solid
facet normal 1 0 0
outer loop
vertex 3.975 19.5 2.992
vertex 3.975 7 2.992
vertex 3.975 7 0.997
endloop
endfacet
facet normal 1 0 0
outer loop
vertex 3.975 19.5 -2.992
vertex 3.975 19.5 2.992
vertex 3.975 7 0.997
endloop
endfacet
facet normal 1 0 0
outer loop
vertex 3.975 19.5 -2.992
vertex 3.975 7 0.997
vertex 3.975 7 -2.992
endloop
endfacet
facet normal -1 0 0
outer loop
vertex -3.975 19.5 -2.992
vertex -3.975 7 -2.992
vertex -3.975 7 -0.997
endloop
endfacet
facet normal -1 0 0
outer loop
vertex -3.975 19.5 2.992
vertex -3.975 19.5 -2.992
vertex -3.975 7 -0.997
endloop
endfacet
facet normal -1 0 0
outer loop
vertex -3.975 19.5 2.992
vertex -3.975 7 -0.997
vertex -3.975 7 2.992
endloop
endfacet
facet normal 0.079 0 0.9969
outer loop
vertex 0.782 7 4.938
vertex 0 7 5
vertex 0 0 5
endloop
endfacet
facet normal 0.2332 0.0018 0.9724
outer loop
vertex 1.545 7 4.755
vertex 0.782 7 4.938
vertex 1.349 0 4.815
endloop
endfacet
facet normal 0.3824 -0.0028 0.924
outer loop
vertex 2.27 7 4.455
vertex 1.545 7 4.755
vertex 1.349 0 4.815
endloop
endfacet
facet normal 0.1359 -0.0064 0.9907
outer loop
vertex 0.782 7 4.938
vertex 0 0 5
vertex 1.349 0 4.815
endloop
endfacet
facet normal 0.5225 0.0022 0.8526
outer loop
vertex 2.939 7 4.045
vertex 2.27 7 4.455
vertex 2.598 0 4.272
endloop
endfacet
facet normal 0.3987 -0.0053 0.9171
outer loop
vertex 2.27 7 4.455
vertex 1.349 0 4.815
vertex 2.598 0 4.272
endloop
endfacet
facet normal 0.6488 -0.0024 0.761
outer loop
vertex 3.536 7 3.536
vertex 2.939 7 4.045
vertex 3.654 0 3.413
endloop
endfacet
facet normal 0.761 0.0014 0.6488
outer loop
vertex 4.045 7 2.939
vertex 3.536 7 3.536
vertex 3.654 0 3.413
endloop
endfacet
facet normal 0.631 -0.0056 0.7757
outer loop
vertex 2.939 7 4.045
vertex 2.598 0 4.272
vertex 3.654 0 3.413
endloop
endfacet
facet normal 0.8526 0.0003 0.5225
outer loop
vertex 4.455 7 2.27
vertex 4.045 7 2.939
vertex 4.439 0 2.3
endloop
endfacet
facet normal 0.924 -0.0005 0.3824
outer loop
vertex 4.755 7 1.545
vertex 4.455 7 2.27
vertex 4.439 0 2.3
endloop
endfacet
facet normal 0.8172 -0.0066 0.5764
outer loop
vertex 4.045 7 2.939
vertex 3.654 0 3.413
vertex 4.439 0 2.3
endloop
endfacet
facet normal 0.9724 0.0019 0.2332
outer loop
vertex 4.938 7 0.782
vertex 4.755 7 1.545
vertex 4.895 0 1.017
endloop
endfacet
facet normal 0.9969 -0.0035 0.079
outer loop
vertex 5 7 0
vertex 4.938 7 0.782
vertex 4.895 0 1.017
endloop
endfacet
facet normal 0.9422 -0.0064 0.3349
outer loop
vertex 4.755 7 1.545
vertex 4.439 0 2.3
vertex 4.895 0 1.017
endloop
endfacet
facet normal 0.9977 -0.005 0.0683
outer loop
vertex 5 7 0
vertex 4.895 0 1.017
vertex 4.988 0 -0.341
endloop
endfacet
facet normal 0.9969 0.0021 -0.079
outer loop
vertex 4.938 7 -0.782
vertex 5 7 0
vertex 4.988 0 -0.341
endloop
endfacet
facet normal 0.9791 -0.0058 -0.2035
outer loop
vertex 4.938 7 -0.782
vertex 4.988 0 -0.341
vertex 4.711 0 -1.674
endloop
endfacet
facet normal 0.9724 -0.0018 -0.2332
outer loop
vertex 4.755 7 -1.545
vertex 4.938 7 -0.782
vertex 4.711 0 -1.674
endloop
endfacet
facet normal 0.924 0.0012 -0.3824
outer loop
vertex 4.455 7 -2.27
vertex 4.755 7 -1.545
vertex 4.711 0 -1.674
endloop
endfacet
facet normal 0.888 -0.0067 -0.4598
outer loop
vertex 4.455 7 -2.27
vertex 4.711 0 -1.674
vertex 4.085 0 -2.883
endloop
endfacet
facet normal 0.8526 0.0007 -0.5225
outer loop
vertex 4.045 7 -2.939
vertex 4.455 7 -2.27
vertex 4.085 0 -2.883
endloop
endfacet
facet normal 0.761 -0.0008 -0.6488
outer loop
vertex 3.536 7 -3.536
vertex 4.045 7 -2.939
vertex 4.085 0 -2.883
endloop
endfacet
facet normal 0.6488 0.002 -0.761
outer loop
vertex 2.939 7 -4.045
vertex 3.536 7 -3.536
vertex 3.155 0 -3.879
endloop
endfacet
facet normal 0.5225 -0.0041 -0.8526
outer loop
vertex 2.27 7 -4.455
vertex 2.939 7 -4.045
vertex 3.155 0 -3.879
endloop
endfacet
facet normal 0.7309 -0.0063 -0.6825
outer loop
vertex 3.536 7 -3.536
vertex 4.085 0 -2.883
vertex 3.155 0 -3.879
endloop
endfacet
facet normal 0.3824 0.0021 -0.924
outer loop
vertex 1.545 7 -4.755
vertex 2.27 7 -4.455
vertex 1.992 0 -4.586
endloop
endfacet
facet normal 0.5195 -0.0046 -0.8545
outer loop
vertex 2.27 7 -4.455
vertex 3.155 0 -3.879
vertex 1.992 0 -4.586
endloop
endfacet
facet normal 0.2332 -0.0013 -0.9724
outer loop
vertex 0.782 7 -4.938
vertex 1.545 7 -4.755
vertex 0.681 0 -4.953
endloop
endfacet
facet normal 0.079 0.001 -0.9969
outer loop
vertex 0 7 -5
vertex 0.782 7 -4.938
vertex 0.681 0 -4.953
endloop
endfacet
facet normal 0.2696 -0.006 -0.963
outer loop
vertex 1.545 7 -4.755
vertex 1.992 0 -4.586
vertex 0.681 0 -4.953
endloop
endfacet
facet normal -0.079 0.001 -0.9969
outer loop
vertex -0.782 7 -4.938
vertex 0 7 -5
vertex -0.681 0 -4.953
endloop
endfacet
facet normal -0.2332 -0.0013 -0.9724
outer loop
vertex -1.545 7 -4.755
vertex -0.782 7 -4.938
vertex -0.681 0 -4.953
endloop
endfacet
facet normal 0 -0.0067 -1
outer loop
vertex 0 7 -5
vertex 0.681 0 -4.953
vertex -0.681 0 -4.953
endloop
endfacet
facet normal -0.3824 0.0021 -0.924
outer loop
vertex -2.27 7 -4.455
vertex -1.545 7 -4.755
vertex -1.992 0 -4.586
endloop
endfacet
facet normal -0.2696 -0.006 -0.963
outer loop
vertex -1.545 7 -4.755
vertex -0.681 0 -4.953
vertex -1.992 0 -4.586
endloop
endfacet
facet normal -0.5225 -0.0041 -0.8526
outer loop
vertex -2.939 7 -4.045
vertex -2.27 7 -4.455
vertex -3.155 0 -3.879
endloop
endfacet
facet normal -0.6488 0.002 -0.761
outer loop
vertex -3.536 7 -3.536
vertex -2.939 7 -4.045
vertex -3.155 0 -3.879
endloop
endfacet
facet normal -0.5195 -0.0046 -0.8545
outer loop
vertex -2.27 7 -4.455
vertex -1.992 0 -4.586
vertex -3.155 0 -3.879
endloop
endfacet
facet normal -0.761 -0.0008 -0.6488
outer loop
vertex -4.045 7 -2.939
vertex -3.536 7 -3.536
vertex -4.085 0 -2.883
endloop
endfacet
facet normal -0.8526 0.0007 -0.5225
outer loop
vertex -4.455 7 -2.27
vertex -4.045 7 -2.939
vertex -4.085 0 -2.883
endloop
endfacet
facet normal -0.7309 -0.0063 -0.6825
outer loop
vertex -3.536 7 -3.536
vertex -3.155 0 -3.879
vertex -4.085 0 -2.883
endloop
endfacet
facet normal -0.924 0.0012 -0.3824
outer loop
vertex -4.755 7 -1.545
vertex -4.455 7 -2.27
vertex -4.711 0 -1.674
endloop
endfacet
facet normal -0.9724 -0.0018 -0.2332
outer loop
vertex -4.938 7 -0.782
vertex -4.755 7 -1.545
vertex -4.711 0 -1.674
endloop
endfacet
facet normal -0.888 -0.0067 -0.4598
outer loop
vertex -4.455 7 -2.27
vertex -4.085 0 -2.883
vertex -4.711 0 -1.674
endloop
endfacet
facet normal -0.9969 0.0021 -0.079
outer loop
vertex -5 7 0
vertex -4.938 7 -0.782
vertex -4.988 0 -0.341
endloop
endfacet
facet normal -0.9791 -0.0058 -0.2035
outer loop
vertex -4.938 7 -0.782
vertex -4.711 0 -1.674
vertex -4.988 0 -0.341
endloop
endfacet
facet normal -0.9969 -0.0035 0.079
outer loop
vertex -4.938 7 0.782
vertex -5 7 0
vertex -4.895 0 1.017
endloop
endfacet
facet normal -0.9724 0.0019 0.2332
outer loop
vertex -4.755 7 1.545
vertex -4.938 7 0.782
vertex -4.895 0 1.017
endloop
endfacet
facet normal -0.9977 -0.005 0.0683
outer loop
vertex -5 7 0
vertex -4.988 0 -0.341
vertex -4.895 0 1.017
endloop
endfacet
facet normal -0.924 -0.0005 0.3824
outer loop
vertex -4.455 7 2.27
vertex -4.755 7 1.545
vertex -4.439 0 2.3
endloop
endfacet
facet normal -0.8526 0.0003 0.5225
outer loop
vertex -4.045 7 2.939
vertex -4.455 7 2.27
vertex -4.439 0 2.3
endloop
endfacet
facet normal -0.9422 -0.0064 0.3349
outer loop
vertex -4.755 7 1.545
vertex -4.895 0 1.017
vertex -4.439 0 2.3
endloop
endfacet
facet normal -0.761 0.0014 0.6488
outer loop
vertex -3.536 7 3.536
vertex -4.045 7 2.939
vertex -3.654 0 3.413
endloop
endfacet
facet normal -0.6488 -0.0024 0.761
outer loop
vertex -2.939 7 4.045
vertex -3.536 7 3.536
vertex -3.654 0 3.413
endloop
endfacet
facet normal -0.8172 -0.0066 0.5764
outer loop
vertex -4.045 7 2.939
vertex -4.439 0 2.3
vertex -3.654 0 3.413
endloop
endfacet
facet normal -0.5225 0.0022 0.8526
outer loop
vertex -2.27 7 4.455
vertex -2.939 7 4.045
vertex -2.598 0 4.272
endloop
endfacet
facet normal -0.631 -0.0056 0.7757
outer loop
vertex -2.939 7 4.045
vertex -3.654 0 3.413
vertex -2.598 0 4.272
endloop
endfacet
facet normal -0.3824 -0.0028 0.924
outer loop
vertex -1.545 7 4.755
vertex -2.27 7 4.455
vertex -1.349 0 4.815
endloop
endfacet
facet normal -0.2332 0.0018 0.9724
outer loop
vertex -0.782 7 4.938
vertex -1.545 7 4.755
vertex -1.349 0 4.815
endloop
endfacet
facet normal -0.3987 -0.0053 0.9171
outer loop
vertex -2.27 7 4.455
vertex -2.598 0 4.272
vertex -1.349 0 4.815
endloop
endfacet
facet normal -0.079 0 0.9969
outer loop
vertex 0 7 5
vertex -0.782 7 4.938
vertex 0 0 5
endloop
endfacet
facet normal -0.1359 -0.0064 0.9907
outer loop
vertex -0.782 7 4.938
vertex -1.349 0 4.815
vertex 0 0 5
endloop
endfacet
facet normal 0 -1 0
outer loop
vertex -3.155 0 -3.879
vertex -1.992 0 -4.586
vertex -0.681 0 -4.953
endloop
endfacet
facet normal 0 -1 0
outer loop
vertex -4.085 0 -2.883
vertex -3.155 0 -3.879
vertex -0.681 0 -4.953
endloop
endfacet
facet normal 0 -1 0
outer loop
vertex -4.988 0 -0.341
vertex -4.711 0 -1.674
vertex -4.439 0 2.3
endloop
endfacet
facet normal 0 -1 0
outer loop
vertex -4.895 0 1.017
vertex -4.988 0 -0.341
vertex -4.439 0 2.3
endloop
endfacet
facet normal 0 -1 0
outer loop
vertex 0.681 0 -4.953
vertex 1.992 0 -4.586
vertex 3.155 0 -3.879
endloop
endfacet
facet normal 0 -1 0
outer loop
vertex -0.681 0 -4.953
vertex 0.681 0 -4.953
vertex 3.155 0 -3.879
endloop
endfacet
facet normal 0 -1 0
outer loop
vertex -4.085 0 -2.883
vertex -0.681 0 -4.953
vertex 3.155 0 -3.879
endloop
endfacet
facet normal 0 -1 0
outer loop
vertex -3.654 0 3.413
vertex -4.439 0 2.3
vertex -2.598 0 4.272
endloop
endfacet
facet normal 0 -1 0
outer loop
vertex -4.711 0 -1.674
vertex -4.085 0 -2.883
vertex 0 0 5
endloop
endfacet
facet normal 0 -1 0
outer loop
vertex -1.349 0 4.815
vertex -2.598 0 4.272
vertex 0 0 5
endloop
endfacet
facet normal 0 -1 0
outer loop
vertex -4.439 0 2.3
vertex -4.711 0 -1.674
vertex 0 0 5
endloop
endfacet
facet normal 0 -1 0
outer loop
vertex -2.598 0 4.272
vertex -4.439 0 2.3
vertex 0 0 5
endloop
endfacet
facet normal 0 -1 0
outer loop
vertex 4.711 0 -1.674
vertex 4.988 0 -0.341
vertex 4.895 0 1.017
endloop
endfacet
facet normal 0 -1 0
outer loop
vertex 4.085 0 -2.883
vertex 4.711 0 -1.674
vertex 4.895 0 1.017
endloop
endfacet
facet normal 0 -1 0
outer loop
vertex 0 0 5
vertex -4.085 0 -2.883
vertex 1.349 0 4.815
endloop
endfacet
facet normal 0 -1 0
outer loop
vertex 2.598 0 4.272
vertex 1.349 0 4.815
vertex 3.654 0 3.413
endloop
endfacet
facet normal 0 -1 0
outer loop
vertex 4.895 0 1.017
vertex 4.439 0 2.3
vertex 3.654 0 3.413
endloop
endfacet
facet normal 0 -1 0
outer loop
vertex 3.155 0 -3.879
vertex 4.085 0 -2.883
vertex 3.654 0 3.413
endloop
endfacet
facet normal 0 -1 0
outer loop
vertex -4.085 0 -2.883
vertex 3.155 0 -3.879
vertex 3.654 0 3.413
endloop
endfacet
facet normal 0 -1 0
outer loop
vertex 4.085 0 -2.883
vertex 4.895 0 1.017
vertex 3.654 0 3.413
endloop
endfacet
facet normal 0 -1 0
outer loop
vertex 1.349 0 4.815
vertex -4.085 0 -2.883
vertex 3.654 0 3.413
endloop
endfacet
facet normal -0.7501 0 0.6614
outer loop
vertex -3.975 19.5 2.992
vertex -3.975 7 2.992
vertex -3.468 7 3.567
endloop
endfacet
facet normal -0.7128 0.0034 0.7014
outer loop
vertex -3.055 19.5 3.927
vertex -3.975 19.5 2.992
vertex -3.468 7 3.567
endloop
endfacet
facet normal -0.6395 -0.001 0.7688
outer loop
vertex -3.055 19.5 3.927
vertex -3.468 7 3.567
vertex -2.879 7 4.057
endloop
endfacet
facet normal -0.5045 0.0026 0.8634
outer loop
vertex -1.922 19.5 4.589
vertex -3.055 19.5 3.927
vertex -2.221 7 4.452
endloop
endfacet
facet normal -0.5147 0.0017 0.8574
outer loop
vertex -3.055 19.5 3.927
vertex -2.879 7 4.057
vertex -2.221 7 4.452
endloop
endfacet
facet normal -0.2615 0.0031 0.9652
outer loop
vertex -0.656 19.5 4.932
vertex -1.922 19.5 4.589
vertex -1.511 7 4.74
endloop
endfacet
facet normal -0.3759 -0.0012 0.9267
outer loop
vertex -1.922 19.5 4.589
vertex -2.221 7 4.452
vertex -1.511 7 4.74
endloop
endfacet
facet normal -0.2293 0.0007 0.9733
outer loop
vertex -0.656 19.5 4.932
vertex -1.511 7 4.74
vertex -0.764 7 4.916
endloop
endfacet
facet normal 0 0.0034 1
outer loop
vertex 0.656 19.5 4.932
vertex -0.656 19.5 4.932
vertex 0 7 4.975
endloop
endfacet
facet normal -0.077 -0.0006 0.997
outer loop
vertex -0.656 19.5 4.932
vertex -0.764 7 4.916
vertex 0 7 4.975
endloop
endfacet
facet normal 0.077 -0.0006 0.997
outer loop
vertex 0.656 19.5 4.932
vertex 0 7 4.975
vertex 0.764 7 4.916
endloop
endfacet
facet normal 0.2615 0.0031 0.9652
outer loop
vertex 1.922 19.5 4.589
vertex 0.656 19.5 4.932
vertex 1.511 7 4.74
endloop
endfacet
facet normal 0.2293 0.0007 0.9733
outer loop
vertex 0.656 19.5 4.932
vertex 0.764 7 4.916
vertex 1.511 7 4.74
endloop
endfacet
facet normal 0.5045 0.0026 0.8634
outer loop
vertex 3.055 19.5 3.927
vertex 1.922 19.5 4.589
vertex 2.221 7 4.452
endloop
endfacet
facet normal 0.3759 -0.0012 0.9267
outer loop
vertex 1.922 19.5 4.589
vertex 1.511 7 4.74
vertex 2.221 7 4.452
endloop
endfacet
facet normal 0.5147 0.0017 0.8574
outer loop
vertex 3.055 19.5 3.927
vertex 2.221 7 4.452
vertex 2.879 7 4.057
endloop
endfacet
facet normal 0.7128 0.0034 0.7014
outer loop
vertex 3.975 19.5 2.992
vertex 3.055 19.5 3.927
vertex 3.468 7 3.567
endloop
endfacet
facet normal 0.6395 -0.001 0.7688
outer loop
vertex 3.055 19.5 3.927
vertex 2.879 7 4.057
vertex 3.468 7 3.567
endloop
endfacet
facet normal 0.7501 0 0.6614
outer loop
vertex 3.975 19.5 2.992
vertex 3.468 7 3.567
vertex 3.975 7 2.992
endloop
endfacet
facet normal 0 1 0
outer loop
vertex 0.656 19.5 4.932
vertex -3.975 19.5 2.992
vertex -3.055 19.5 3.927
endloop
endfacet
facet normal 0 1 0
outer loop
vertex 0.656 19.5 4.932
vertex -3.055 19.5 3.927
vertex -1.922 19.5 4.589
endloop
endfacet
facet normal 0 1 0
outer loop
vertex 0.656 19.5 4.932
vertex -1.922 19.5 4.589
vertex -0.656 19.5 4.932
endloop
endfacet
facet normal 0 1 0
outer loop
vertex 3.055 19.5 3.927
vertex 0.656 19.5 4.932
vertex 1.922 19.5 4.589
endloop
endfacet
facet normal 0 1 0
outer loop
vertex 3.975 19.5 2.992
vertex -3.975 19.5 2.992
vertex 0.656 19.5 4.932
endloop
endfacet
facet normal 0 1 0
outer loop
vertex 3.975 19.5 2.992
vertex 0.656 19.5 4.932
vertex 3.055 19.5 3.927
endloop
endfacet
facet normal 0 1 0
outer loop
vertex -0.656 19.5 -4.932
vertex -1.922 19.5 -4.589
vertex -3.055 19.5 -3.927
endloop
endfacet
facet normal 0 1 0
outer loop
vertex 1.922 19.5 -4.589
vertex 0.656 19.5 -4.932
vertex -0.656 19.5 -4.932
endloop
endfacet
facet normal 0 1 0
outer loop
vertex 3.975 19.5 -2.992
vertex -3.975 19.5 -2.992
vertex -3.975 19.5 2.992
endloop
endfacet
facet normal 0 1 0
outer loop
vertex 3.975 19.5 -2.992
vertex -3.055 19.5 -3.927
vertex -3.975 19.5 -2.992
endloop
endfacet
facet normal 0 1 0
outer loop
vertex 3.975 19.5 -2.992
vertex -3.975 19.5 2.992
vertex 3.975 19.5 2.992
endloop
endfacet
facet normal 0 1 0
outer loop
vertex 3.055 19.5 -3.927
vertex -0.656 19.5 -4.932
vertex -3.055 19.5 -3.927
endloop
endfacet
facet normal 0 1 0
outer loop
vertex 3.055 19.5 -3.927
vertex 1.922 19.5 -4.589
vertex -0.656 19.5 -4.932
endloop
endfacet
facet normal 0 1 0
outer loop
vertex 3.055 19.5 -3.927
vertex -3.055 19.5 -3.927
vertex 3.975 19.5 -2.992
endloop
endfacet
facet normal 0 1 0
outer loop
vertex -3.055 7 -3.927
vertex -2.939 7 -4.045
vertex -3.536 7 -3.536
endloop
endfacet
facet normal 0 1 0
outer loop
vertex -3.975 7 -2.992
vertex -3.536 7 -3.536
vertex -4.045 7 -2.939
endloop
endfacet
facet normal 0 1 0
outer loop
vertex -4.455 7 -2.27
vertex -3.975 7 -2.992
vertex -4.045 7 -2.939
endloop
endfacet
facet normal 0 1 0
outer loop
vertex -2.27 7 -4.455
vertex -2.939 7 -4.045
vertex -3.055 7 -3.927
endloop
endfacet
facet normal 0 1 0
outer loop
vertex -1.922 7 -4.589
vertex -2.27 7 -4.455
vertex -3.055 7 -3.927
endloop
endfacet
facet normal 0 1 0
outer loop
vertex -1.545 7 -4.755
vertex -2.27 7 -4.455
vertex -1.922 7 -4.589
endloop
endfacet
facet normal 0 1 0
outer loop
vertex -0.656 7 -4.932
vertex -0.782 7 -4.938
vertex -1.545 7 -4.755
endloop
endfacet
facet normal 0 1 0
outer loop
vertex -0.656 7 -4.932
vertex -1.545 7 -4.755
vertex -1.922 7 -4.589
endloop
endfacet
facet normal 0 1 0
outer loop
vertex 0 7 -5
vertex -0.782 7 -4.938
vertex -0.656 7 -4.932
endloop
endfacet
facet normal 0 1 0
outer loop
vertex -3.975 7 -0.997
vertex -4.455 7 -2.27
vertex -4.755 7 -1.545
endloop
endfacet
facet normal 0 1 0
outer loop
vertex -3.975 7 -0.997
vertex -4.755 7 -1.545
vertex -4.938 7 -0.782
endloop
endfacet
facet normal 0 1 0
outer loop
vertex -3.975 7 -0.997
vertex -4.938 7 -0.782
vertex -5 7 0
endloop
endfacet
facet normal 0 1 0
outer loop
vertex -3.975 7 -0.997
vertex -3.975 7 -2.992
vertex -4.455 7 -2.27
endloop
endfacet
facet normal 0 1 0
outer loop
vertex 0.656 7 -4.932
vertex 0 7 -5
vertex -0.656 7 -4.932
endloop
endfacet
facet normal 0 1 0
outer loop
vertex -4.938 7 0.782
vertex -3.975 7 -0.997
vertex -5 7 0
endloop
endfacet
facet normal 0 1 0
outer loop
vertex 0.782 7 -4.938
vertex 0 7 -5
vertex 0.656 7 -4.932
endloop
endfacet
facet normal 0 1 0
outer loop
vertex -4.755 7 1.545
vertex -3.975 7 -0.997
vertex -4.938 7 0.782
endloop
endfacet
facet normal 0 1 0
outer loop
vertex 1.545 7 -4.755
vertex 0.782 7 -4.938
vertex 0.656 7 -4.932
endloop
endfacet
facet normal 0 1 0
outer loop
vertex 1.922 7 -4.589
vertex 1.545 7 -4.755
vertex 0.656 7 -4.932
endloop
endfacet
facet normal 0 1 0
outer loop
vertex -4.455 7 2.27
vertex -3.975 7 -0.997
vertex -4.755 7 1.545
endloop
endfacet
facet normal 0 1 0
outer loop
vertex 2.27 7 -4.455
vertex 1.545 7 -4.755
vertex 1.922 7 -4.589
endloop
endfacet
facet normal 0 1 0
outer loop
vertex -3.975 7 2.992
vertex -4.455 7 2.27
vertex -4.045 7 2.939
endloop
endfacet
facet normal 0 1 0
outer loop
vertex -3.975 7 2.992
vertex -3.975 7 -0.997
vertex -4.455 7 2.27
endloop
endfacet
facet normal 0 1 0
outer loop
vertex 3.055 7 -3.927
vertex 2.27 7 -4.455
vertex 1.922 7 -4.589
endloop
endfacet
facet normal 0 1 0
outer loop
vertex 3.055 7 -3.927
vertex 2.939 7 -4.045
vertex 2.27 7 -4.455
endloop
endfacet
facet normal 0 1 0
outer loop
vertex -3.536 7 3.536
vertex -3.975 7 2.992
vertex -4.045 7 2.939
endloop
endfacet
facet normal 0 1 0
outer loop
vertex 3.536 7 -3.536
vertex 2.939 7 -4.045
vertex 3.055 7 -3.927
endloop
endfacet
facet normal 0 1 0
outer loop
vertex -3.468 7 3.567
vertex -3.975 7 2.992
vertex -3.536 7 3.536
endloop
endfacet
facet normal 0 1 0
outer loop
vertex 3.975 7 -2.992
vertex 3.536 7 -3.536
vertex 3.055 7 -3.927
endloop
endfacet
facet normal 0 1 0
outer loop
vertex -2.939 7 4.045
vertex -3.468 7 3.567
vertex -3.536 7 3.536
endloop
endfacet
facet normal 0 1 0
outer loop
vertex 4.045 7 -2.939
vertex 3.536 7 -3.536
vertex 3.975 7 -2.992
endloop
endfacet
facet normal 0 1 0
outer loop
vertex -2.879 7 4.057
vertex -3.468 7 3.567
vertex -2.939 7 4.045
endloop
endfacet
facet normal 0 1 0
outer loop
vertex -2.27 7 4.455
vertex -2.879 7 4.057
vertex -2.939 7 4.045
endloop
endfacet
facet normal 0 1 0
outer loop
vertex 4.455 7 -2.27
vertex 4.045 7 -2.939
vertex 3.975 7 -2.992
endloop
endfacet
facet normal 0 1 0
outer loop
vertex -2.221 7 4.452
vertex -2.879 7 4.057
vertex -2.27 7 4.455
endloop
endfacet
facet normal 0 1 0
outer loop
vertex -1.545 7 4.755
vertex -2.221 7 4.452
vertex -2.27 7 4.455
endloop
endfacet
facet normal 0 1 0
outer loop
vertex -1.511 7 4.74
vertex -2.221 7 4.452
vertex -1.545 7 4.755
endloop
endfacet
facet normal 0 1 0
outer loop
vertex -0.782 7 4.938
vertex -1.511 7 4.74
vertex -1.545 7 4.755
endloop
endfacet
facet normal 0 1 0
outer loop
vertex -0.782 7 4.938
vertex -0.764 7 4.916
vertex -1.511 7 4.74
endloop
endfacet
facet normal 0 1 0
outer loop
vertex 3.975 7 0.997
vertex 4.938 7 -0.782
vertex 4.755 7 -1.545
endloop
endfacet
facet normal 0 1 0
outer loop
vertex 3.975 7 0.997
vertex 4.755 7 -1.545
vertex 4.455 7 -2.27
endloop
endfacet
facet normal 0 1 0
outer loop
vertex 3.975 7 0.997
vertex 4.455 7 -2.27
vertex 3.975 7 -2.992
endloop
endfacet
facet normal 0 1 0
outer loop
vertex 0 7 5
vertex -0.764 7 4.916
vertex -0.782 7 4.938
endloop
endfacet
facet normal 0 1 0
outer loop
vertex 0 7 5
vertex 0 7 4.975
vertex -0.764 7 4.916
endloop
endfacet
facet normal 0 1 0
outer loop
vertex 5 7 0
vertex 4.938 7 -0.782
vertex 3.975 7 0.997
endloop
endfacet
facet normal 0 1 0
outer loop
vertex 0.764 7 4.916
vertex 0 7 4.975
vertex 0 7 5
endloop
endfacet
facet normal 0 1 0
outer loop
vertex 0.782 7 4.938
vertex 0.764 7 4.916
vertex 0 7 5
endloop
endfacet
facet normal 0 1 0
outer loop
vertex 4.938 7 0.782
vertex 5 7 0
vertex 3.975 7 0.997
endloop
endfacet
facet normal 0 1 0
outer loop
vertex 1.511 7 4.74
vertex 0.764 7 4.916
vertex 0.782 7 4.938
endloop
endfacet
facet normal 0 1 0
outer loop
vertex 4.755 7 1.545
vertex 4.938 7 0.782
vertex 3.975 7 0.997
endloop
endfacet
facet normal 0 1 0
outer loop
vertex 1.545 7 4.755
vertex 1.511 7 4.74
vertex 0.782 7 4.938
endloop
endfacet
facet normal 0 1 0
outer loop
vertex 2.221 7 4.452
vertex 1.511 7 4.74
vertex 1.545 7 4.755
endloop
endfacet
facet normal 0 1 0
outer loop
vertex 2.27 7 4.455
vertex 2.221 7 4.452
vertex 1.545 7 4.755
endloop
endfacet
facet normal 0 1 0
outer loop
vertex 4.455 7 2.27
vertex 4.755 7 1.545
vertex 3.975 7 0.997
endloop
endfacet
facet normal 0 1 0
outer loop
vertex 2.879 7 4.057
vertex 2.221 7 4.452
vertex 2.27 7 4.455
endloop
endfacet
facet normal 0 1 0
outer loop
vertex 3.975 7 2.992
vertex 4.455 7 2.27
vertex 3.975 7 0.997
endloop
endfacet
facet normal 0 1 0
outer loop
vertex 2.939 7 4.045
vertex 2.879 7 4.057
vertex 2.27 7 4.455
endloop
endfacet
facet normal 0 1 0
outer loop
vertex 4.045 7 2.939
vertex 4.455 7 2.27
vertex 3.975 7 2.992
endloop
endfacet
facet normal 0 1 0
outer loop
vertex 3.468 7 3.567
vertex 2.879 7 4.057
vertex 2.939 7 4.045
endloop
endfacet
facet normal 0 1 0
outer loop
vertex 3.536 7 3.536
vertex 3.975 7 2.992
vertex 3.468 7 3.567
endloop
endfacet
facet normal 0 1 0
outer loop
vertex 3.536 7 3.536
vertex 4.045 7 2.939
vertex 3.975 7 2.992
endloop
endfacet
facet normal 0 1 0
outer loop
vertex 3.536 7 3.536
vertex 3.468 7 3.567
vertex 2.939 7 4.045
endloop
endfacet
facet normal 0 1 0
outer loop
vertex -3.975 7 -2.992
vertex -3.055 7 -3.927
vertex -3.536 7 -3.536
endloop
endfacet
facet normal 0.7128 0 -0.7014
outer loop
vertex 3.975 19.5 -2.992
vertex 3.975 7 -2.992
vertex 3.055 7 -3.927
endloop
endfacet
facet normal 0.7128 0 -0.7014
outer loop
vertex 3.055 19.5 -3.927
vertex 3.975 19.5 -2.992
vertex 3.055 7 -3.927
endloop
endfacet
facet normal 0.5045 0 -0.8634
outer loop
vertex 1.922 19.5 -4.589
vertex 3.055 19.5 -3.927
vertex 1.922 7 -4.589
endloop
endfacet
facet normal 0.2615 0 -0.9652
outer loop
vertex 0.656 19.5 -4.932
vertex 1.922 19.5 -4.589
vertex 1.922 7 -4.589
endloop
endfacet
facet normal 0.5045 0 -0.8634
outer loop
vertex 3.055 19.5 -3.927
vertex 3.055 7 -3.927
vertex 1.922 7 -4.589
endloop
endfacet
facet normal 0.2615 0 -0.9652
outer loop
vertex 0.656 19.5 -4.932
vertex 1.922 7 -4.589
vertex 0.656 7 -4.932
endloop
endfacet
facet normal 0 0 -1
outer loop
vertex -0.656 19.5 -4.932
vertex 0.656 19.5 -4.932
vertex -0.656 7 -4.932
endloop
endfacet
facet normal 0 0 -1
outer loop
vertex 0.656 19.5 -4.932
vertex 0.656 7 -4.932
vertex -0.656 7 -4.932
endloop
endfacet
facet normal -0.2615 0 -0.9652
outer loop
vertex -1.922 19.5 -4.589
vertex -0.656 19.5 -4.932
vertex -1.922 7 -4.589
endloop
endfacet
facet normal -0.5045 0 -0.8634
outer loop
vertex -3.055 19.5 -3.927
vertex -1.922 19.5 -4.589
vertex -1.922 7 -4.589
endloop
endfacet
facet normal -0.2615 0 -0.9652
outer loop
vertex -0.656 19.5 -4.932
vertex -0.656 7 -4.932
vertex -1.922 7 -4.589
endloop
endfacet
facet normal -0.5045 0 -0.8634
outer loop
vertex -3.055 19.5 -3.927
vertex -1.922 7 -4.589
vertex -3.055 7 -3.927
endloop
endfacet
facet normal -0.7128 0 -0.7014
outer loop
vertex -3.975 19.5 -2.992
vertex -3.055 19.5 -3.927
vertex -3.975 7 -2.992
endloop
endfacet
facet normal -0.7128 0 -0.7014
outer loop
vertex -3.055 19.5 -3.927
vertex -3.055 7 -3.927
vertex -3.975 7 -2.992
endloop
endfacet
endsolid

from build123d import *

# Parameters (mm, degrees)
SKETCH2_R           = 5
BOSS_EXTRUDE1_DEPTH = 7
BOSS_EXTRUDE2_DEPTH = 12.5


with BuildPart() as part:
    # Sketch2 → Boss-Extrude1 (new body)
    with BuildSketch(Plane(origin=(0, 0, 0), x_dir=(1, 0, 0), z_dir=(0, 1, 0))):
        with Locations(Location((0, 0, 0), (0, 0, 270))):
            Circle(SKETCH2_R)
    extrude(amount=BOSS_EXTRUDE1_DEPTH)

    # Sketch3 → Boss-Extrude2 (add)
    with BuildSketch(Plane(origin=(0, 7, 0), x_dir=(1, 0, 0), z_dir=(0, 1, 0))):
        with BuildLine():
            Line((-3.975, 2.99165506), (-3.975, -2.99165506))
            ThreePointArc((-3.975, -2.99165506), (0, -4.975), (3.975, -2.99165506))
            Line((3.975, -2.99165506), (3.975, 2.99165506))
            ThreePointArc((3.975, 2.99165506), (0, 4.975), (-3.975, 2.99165506))
        make_face()
    extrude(amount=BOSS_EXTRUDE2_DEPTH)


solid = part.part
